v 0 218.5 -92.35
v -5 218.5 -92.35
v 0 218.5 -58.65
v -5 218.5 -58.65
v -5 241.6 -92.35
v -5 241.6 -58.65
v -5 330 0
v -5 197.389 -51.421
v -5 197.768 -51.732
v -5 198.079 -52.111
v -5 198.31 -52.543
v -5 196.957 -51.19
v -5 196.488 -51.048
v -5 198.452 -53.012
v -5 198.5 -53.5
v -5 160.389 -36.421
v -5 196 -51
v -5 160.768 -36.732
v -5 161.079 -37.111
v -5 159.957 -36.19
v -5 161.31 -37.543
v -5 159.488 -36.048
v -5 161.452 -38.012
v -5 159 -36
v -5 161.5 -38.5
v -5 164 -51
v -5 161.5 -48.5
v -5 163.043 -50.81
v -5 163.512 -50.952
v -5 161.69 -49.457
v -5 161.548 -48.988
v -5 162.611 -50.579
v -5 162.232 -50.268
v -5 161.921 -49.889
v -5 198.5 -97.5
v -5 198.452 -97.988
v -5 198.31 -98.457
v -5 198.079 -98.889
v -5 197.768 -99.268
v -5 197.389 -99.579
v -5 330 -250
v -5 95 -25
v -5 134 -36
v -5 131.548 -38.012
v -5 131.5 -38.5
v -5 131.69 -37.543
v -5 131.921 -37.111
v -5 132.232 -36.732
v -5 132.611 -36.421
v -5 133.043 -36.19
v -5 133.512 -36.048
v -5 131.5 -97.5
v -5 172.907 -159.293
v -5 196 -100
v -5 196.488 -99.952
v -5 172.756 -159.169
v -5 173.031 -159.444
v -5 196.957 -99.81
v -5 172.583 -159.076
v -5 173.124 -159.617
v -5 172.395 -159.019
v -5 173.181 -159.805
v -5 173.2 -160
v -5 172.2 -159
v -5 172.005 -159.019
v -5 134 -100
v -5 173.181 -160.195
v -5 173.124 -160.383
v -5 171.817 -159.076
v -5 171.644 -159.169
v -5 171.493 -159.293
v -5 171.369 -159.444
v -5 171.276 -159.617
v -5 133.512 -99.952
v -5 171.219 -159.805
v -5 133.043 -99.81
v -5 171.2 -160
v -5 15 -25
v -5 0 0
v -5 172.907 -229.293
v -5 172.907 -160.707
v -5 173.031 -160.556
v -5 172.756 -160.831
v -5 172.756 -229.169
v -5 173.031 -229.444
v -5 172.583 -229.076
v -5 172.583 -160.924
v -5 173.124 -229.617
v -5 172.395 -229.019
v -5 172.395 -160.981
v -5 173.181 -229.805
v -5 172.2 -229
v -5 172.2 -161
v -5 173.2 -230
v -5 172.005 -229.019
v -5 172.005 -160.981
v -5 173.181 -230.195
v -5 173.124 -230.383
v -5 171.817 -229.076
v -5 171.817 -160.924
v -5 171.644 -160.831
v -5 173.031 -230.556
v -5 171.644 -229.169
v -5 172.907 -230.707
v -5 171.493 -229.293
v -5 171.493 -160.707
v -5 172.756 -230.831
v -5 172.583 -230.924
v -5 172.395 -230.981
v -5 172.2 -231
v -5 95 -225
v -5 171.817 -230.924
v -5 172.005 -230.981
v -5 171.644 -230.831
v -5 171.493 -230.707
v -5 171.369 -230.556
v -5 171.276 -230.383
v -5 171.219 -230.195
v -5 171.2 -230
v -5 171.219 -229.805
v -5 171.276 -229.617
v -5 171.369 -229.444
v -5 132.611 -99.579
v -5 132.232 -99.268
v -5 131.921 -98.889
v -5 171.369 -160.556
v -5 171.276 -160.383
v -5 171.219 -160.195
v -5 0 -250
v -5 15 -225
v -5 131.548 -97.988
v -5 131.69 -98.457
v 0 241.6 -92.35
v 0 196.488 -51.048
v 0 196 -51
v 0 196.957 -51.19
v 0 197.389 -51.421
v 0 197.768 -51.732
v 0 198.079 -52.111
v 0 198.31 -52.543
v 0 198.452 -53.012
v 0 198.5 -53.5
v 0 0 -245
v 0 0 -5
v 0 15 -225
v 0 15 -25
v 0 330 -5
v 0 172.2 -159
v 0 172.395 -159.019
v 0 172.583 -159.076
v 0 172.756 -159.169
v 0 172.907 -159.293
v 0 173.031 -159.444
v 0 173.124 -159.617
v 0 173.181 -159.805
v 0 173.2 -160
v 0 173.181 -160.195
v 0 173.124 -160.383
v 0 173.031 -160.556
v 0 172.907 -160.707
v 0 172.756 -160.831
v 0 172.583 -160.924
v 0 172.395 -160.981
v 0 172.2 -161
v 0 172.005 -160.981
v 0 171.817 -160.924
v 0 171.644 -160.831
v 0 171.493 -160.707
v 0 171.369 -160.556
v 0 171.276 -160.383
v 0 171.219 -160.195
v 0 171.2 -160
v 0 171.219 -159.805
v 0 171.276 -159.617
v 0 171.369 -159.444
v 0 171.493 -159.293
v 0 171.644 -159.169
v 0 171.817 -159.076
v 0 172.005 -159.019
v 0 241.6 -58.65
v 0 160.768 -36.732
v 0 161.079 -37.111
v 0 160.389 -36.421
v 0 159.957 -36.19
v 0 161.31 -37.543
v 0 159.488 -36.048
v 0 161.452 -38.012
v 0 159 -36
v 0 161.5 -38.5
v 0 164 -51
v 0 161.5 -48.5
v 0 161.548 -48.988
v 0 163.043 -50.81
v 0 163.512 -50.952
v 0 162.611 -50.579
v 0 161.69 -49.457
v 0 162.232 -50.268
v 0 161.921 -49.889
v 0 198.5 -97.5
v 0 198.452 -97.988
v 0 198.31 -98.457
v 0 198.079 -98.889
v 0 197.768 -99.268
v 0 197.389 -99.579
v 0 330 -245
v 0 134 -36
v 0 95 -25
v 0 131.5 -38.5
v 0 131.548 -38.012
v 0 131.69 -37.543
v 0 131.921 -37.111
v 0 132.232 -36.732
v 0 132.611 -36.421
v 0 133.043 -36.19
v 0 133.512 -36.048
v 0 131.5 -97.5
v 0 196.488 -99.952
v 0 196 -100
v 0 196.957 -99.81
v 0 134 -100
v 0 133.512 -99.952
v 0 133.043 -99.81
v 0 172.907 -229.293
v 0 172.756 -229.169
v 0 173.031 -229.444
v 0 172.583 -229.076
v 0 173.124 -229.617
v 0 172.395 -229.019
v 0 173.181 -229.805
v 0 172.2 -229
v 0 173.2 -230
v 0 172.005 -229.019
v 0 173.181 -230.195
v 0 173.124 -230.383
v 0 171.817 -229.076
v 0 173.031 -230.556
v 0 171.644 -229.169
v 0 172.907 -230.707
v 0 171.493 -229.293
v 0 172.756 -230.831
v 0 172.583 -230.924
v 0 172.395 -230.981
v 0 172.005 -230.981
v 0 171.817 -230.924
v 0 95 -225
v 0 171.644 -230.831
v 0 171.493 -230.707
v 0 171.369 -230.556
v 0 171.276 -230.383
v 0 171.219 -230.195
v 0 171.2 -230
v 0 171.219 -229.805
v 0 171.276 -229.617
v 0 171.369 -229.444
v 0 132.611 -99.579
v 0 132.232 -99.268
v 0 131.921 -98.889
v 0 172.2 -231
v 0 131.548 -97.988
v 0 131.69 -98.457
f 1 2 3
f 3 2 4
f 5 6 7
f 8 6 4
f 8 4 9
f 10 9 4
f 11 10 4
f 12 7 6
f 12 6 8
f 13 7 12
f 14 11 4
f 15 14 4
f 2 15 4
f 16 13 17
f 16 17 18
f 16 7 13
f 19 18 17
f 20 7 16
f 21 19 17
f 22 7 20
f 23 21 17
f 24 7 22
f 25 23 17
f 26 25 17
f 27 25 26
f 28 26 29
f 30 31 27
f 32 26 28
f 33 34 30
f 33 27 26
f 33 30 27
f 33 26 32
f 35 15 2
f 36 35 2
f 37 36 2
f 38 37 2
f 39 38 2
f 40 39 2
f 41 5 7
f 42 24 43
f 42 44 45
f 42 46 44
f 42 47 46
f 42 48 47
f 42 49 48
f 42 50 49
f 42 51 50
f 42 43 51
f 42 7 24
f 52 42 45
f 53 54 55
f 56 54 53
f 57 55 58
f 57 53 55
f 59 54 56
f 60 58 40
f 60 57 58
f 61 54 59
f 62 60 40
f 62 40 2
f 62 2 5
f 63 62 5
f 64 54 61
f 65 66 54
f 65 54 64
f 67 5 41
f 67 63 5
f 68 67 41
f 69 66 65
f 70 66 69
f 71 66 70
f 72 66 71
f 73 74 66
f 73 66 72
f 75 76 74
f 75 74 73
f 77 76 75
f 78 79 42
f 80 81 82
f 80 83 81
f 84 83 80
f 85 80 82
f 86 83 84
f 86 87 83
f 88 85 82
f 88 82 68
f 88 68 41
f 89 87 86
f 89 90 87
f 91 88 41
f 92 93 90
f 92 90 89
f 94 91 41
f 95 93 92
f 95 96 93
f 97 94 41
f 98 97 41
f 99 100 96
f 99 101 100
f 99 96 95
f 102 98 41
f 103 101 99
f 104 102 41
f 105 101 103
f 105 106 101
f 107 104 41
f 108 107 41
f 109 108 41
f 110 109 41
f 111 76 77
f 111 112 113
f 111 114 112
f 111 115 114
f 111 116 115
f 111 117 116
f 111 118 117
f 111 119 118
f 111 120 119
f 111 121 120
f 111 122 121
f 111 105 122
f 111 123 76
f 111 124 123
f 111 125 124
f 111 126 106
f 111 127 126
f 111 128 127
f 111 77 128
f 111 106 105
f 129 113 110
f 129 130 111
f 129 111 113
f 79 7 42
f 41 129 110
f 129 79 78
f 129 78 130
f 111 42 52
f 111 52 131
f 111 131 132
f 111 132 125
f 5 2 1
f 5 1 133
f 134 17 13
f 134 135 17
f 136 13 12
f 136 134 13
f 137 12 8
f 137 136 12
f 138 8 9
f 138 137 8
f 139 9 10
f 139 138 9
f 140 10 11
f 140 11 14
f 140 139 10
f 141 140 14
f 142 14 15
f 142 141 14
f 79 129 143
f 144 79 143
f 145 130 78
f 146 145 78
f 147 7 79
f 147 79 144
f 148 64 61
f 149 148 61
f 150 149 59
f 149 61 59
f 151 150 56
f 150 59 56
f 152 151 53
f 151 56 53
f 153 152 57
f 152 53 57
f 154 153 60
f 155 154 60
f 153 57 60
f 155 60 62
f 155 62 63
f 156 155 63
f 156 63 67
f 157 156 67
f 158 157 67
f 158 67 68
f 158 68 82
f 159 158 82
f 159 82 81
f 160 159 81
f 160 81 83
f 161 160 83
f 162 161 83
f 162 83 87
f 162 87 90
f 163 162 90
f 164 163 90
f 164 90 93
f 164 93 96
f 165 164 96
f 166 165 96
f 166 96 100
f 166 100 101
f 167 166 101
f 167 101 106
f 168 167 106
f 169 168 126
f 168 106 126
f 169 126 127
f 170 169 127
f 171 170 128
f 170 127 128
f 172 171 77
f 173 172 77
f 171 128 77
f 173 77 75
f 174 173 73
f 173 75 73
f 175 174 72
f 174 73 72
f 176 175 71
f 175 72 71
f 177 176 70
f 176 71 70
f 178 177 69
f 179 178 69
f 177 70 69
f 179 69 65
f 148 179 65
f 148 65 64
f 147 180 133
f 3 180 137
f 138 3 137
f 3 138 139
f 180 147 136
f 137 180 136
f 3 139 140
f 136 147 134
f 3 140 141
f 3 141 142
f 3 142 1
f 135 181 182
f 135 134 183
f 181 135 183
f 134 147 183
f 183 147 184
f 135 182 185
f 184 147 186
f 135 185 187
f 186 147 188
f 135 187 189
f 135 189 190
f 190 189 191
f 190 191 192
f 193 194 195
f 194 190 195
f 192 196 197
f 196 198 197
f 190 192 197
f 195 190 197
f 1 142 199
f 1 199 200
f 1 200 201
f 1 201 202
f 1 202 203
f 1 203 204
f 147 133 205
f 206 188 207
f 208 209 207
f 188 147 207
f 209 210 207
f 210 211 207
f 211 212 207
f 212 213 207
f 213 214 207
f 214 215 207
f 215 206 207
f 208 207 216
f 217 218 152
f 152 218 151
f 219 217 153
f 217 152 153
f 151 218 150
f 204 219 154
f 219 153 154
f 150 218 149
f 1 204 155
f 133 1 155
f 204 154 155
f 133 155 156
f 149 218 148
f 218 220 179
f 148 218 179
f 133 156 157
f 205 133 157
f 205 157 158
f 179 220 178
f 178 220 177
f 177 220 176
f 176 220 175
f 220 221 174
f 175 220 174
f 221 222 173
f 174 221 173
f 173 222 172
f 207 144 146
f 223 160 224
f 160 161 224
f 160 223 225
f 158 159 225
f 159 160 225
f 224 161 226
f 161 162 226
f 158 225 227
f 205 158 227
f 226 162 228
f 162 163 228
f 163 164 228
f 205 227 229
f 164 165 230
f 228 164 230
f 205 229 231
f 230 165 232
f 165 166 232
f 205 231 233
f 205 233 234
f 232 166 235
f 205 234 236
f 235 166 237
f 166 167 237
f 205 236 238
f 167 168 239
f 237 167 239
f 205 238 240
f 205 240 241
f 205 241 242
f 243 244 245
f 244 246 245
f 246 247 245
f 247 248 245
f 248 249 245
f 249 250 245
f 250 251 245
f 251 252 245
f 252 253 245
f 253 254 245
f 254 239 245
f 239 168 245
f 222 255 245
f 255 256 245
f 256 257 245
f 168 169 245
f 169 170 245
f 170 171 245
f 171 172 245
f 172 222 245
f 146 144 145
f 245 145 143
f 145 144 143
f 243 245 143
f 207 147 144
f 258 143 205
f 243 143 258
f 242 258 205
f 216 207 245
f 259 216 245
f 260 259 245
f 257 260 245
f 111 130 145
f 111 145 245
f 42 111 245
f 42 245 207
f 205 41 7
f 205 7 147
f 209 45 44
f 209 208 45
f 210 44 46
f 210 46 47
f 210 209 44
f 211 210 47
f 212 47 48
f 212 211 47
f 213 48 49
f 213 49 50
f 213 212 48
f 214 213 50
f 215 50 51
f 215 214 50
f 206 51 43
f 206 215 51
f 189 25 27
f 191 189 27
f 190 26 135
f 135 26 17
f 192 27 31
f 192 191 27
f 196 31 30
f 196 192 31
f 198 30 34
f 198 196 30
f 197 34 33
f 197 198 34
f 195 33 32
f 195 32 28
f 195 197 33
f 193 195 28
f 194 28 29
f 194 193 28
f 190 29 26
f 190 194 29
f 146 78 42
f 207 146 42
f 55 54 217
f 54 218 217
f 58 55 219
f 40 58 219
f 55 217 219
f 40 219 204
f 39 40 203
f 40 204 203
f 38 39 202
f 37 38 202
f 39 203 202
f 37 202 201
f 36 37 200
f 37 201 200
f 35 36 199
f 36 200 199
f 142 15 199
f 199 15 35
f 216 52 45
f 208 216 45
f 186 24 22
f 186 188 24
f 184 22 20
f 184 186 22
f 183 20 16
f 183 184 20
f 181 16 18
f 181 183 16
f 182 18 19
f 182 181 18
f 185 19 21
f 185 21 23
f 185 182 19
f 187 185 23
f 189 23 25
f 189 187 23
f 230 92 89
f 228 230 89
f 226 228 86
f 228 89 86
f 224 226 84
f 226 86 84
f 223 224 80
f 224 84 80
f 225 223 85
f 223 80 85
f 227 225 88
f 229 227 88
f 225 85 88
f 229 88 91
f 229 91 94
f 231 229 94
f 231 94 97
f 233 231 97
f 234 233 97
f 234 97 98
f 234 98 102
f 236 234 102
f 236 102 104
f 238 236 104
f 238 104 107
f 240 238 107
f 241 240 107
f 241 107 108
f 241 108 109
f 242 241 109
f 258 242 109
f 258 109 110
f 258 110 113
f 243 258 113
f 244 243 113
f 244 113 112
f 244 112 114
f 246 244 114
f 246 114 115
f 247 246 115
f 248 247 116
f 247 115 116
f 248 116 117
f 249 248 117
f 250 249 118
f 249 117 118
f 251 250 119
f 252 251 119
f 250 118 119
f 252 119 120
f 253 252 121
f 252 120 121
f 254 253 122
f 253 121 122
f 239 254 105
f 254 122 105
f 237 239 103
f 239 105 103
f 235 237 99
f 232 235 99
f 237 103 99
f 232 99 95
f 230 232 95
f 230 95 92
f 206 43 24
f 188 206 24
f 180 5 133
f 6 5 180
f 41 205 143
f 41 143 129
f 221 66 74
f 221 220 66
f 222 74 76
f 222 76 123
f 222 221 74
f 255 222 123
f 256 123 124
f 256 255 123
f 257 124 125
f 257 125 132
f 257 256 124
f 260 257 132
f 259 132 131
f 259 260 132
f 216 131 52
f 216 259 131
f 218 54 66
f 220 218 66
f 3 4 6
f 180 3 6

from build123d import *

# Parameters (mm, degrees)
CROQUIS1_W              = 5
CROQUIS1_H              = 250
SALIENTE_EXTRUIR1_DEPTH = 330
CORTAR_EXTRUIR1_REACH   = 416.035
CORTAR_EXTRUIR2_REACH   = 416.035
CROQUIS3_W              = 200
CROQUIS3_H              = 80
CORTAR_EXTRUIR3_DEPTH   = 415.035022673
REDONDEO1_R             = 2.5
CROQUIS5_W              = 33.7
CROQUIS5_H              = 23.1
CORTAR_EXTRUIR4_DEPTH   = 415.035022673
CORTAR_EXTRUIR5_REACH   = 416.035
CROQUIS6_R              = 1


with BuildPart() as part:
    # Croquis1 → Saliente-Extruir1 (new body)
    with BuildSketch(Plane(origin=(0, 0, 0), x_dir=(1, 0, 0), z_dir=(0, 1, 0))):
        with Locations((-2.5, 125)):
            Rectangle(CROQUIS1_W, CROQUIS1_H)
    extrude(amount=SALIENTE_EXTRUIR1_DEPTH)

    # Croquis2 → Cortar-Extruir1 (cut, up to next)
    with BuildSketch(Plane(origin=(0, 330, 0), x_dir=(1, 0, 0), z_dir=(0, 1, 0)), mode=Mode.PRIVATE) as cortar_extruir1_sk1:
        Polygon((0, 250), (0, 245), (-5, 250), align=None)
    cortar_extruir1_tool1 = extrude(cortar_extruir1_sk1.sketch, amount=-CORTAR_EXTRUIR1_REACH, mode=Mode.PRIVATE) & part.part
    # Croquis2 → Cortar-Extruir1 (cut, up to next)
    with BuildSketch(Plane(origin=(0, 330, 0), x_dir=(1, 0, 0), z_dir=(0, 1, 0)), mode=Mode.PRIVATE) as cortar_extruir1_sk2:
        Polygon((-5, 0), (0, 5), (0, 0), align=None)
    cortar_extruir1_tool2 = extrude(cortar_extruir1_sk2.sketch, amount=-CORTAR_EXTRUIR1_REACH, mode=Mode.PRIVATE) & part.part
    add(cortar_extruir1_tool1.solids().sort_by_distance((-1.666667, 330, -248.333333))[0], mode=Mode.SUBTRACT)
    add(cortar_extruir1_tool2.solids().sort_by_distance((-1.666667, 330, -1.666667))[0], mode=Mode.SUBTRACT)

    # Croquis3 → Cortar-Extruir2 (cut, up to next)
    with BuildSketch(Plane.ZY.offset(5), mode=Mode.PRIVATE) as cortar_extruir2_sk1:
        with Locations((-125, 55)):
            Rectangle(CROQUIS3_W, CROQUIS3_H)
    cortar_extruir2_tool1 = extrude(cortar_extruir2_sk1.sketch, amount=-CORTAR_EXTRUIR2_REACH, mode=Mode.PRIVATE) & part.part
    add(cortar_extruir2_tool1.solids().sort_by_distance((-5, 55, -125))[0], mode=Mode.SUBTRACT)

    # Croquis4 → Cortar-Extruir3 (cut, through all)
    with BuildSketch(Plane.ZY.offset(5)):
        Polygon((-100, 198.5), (-100, 131.5), (-51, 131.5), (-36, 131.5), (-36, 161.5), (-51, 161.5), (-51, 198.5), align=None)
    extrude(amount=-CORTAR_EXTRUIR3_DEPTH, mode=Mode.SUBTRACT)

    # Redondeo1
    redondeo1_edges = [part.edges().sort_by_distance(p)[0] for p in [
        (-2.5, 131.5, -100),
        (-2.5, 198.5, -100),
        (-2.5, 198.5, -51),
        (-2.5, 161.5, -51),
        (-2.5, 161.5, -36),
        (-2.5, 131.5, -36),
    ]]
    fillet(redondeo1_edges, radius=REDONDEO1_R)

    # Croquis5 → Cortar-Extruir4 (cut, through all)
    with BuildSketch(Plane.ZY.offset(5)):
        with Locations((-75.5, 230.05)):
            Rectangle(CROQUIS5_W, CROQUIS5_H)
    extrude(amount=-CORTAR_EXTRUIR4_DEPTH, mode=Mode.SUBTRACT)

    # Croquis6 → Cortar-Extruir5 (cut, up to next)
    with BuildSketch(Plane.ZY.offset(5), mode=Mode.PRIVATE) as cortar_extruir5_sk1:
        with Locations((-230, 172.2)):
            Circle(CROQUIS6_R)
    cortar_extruir5_tool1 = extrude(cortar_extruir5_sk1.sketch, amount=-CORTAR_EXTRUIR5_REACH, mode=Mode.PRIVATE) & part.part
    # Croquis6 → Cortar-Extruir5 (cut, up to next)
    with BuildSketch(Plane.ZY.offset(5), mode=Mode.PRIVATE) as cortar_extruir5_sk2:
        with Locations((-160, 172.2)):
            Circle(CROQUIS6_R)
    cortar_extruir5_tool2 = extrude(cortar_extruir5_sk2.sketch, amount=-CORTAR_EXTRUIR5_REACH, mode=Mode.PRIVATE) & part.part
    add(cortar_extruir5_tool1.solids().sort_by_distance((-5, 172.2, -230))[0], mode=Mode.SUBTRACT)
    add(cortar_extruir5_tool2.solids().sort_by_distance((-5, 172.2, -160))[0], mode=Mode.SUBTRACT)


solid = part.part
